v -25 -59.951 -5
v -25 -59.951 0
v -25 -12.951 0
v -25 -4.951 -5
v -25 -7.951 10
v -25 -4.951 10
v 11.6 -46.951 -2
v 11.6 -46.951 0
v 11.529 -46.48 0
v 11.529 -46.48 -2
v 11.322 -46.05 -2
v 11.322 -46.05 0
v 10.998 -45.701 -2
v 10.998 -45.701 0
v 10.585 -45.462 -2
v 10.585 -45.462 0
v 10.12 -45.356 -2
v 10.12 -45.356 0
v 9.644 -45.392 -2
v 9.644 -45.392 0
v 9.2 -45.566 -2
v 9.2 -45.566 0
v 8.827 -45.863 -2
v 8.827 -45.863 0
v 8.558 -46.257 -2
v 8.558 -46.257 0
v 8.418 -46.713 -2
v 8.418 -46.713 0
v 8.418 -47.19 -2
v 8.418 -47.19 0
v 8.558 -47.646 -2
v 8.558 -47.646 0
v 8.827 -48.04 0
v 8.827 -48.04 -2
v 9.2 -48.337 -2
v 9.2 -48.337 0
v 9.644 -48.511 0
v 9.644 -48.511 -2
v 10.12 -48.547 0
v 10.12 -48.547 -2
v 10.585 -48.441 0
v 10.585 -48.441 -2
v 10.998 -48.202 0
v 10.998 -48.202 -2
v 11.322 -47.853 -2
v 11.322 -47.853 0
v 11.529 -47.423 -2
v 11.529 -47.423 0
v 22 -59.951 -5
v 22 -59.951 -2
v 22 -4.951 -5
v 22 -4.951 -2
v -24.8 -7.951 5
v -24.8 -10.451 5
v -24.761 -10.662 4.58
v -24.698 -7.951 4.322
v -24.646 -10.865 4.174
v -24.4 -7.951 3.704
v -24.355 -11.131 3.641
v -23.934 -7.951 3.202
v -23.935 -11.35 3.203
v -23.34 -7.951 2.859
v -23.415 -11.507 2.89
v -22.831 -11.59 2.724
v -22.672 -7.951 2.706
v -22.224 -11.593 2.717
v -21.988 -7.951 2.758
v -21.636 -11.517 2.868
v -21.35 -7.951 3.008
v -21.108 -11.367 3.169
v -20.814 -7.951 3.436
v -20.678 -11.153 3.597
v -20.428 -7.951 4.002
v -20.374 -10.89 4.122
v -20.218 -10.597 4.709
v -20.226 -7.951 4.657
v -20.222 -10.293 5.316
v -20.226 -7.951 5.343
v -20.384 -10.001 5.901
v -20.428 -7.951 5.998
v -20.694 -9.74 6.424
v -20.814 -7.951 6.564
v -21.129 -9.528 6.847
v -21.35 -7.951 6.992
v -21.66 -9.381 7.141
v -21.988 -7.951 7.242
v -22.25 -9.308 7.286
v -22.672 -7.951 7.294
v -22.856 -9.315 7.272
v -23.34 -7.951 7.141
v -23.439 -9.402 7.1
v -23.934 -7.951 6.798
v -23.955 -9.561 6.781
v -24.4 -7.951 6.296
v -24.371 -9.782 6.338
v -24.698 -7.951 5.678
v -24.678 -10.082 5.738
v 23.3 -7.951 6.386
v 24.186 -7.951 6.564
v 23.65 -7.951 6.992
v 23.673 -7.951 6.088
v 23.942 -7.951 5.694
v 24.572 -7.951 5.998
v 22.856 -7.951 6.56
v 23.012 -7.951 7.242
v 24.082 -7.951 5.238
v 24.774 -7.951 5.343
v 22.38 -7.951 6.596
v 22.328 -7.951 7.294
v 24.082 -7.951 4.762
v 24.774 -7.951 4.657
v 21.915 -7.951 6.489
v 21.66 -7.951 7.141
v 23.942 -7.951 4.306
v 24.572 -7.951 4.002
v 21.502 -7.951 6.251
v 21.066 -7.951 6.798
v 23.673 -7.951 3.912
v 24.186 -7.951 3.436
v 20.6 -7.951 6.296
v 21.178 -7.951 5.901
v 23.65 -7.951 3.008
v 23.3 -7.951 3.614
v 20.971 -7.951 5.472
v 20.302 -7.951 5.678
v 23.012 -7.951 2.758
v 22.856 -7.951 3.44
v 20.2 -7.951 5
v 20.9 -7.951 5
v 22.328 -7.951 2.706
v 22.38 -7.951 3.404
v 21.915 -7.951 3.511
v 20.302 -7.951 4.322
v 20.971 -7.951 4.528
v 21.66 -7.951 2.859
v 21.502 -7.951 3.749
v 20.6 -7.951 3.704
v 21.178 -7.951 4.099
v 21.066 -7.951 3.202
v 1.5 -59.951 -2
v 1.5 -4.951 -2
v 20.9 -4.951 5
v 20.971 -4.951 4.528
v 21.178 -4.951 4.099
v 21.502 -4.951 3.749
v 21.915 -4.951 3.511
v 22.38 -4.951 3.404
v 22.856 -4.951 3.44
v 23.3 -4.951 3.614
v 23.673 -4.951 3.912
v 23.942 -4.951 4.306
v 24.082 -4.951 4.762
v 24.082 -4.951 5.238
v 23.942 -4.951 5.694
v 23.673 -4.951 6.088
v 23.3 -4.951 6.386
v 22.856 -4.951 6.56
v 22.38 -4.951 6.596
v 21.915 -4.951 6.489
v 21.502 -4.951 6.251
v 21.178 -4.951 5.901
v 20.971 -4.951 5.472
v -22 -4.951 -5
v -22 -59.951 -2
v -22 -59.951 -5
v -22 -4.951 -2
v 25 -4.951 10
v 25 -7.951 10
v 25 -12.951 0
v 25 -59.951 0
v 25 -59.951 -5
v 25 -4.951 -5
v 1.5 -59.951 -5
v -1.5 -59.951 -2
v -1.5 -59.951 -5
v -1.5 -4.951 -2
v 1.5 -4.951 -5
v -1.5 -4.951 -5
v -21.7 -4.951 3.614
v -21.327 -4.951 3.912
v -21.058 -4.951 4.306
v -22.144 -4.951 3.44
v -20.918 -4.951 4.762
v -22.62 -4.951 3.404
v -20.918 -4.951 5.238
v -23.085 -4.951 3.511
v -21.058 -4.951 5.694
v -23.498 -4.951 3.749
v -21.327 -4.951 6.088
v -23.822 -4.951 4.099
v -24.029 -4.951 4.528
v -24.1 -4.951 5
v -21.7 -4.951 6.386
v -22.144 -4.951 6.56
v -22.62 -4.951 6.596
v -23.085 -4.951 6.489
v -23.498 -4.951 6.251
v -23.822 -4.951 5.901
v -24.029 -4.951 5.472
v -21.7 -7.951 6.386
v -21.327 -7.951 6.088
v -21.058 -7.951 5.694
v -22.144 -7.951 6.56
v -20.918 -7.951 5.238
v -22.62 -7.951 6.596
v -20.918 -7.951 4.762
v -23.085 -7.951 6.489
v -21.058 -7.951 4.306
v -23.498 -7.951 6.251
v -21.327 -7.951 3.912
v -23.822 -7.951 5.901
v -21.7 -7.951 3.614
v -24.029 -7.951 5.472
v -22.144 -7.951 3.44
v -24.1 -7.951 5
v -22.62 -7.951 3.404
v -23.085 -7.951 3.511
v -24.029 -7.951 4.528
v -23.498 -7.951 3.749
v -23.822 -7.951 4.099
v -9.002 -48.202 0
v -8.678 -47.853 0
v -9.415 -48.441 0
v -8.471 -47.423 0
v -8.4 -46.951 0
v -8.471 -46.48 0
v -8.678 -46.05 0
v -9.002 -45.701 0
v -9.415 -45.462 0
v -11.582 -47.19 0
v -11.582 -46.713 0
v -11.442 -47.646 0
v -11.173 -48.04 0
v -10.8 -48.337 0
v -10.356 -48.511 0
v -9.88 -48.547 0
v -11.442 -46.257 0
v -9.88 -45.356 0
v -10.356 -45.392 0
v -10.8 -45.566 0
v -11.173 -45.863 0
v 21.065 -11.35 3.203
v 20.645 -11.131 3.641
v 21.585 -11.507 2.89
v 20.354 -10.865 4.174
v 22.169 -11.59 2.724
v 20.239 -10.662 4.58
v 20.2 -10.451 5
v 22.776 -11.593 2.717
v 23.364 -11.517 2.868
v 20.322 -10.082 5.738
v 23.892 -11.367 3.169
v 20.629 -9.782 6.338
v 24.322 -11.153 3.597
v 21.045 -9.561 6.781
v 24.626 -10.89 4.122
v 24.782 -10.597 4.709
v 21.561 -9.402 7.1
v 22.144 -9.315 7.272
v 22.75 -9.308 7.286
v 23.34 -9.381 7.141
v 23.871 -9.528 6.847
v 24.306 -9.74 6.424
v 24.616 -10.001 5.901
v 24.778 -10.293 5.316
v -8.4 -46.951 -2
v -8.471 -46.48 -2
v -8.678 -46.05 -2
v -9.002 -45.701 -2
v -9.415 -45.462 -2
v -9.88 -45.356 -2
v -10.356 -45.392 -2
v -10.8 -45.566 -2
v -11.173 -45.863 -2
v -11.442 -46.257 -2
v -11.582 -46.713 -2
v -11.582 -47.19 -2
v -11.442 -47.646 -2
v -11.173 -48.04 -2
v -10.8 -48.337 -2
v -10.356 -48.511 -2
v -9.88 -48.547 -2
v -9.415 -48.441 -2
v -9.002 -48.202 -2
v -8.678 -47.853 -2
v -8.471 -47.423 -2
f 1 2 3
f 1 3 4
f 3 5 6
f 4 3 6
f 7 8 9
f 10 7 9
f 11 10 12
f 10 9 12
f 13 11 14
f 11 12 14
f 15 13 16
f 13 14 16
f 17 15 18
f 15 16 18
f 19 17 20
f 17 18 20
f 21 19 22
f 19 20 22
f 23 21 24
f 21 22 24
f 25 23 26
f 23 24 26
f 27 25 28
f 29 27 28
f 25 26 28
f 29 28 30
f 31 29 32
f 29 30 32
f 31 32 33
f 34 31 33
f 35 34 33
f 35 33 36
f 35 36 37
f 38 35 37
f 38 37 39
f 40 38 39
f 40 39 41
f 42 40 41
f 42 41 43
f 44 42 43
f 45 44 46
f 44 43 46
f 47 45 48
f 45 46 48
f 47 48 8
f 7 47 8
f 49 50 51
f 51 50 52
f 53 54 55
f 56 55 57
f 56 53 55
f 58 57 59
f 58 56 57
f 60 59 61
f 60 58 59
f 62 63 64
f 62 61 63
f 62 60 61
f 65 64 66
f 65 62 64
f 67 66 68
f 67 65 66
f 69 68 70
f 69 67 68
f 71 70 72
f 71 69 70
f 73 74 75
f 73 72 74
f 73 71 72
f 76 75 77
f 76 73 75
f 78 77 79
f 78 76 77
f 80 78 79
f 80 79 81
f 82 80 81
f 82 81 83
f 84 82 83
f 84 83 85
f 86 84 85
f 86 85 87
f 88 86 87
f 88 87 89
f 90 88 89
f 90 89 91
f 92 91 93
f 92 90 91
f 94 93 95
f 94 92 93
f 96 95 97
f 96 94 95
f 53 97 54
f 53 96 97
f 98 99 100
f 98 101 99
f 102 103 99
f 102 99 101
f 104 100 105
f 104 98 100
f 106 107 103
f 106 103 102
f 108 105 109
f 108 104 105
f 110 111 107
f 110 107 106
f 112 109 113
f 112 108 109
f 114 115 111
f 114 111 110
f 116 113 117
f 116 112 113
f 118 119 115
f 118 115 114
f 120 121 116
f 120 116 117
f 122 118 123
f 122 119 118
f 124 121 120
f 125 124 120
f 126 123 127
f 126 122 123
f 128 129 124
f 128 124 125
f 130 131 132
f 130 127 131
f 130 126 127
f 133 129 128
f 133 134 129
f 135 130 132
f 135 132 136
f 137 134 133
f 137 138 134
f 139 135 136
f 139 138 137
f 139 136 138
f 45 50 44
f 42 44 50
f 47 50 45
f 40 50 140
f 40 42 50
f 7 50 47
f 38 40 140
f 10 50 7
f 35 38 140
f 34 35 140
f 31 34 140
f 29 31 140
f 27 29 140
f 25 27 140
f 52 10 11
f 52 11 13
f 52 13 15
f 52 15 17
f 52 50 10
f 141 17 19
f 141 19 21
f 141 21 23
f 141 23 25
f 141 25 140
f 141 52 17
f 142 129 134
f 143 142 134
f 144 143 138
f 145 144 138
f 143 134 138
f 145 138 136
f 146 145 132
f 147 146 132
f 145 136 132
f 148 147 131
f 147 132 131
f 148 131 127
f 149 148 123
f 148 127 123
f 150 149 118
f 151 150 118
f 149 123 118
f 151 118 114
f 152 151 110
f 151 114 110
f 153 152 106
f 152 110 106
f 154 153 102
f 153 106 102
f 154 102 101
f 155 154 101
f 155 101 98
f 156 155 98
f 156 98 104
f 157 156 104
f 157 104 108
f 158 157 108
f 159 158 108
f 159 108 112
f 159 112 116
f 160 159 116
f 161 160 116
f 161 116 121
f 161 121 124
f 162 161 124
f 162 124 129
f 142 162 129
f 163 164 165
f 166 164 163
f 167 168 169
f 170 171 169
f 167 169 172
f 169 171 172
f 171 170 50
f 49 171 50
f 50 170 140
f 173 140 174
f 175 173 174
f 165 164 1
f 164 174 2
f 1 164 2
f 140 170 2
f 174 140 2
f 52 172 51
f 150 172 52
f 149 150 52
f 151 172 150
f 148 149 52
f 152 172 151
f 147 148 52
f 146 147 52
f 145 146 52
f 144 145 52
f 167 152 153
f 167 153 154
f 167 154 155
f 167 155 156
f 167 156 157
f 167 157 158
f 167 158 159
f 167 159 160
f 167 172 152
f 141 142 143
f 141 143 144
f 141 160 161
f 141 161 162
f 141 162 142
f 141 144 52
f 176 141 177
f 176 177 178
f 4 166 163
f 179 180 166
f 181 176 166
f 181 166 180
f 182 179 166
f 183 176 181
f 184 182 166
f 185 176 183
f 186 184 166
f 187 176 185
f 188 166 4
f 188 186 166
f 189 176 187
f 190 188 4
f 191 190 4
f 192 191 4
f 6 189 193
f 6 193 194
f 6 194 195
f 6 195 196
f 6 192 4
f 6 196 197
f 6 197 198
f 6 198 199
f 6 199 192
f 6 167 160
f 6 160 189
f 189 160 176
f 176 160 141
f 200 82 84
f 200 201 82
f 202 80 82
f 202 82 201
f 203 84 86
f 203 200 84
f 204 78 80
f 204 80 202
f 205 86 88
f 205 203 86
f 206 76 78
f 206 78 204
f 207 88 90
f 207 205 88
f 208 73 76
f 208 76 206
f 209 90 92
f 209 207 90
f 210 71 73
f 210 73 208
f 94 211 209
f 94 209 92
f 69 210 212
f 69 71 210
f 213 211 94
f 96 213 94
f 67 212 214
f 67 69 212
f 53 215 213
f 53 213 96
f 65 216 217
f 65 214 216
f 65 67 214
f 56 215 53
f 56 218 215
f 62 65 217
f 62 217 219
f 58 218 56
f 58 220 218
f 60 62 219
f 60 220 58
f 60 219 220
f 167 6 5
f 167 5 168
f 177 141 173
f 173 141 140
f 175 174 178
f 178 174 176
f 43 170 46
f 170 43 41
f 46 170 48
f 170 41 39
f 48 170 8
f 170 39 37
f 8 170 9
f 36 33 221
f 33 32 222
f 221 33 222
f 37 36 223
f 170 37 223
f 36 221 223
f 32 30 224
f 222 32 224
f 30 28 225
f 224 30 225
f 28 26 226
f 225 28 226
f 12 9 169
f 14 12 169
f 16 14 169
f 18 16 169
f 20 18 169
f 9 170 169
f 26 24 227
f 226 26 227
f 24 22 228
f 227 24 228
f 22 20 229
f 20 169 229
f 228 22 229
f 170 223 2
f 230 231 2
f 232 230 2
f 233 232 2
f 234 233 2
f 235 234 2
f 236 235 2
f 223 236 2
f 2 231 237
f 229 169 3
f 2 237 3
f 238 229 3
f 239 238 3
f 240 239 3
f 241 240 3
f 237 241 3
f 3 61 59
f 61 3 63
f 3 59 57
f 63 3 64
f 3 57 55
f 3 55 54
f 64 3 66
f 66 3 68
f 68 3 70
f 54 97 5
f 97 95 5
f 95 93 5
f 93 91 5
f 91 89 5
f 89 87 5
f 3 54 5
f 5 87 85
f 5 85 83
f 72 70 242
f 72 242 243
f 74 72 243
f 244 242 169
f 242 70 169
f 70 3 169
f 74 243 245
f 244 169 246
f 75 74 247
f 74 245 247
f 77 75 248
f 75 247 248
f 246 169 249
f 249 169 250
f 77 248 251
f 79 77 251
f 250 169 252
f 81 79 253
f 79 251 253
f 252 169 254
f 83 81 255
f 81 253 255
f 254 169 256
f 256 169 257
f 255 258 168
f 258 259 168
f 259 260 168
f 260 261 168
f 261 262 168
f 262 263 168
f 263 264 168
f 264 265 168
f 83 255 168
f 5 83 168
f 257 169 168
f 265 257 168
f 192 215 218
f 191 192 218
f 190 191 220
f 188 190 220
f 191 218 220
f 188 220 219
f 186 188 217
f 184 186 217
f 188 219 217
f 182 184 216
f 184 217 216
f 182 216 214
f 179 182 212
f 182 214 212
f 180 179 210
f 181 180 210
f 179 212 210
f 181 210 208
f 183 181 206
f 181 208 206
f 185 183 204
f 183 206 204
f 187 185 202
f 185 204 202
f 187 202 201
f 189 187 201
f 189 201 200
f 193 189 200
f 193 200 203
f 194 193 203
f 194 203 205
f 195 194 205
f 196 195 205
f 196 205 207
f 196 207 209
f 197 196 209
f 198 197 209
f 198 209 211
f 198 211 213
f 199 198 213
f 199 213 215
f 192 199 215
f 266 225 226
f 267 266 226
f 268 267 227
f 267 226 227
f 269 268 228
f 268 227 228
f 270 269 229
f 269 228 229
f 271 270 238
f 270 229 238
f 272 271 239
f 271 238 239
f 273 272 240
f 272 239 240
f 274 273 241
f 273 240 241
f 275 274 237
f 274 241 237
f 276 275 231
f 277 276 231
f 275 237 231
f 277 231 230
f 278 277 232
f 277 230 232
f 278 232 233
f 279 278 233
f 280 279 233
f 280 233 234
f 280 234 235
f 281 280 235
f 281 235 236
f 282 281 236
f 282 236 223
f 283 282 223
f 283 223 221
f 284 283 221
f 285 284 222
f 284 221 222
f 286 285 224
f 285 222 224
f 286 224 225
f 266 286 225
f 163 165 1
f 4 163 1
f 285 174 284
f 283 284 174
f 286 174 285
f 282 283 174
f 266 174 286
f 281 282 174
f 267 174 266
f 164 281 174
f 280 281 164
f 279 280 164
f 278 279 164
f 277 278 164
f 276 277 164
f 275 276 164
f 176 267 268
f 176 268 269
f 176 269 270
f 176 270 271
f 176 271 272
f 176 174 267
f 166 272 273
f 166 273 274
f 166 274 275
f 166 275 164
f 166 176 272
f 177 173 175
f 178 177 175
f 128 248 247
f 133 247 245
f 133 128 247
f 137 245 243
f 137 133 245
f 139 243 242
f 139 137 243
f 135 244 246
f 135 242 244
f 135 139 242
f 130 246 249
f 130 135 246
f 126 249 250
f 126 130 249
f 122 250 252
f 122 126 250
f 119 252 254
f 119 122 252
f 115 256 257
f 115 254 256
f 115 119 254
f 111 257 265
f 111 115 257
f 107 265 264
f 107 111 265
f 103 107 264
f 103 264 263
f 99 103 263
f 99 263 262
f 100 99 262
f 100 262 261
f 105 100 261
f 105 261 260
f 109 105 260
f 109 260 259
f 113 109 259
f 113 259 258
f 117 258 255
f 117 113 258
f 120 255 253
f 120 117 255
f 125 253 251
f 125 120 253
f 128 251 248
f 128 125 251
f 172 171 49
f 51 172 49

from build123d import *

# Parameters (mm, degrees)
SKETCH_1_R          = 1.6
EXTRUDE_2_DEPTH     = 2
SKETCH_2_W          = 50
SKETCH_2_H          = 3
EXTRUDE_3_DEPTH     = 10
SKETCH_3_R          = 1.45
CUT_EXTRUDE_1_DEPTH = 3
EXTRUDE_4_DEPTH     = 50
SKETCH_8_R          = 1.6
CUT_EXTRUDE_4_DEPTH = 4
SKETCH_7_R          = 2.3
CUT_EXTRUDE_6_DEPTH = 20
SKETCH_10_W         = 3
SKETCH_10_H         = 55
EXTRUDE_5_DEPTH     = 3


with BuildPart() as part:
    # 草图1 → 凸台-拉伸2 (new body)
    with BuildSketch(Plane.XY):
        Polygon((25, -4.951489209), (25, -59.951489209), (-25, -59.951489209), (-25, -4.951489209), (0, -4.951489209), align=None)
        with Locations((10, -46.951489209)):
            Circle(SKETCH_1_R, mode=Mode.SUBTRACT)
        with Locations((-10, -46.951489209)):
            Circle(SKETCH_1_R, mode=Mode.SUBTRACT)
    extrude(amount=-EXTRUDE_2_DEPTH)

    # 草图2 → 凸台-拉伸3 (add)
    with BuildSketch(Plane.XY):
        with Locations((0, -6.451489209)):
            Rectangle(SKETCH_2_W, SKETCH_2_H)
    extrude(amount=EXTRUDE_3_DEPTH)

    # 草图3 → 切除-拉伸1 (cut)
    with BuildSketch(Plane(origin=(0, -7.951489209, 0), x_dir=(-1, 0, 0), z_dir=(0, -1, 0))):
        with Locations((22.5, -5)):
            Circle(SKETCH_3_R)
        with Locations((-22.5, -5)):
            Circle(SKETCH_3_R)
    extrude(amount=-CUT_EXTRUDE_1_DEPTH, mode=Mode.SUBTRACT)

    # 草图5 → 凸台-拉伸4 (add)
    with BuildSketch(Plane(origin=(25, -7.951489209, 0), x_dir=(0, 0, -1), z_dir=(1, 0, 0))):
        Polygon((-10, 0), (0, 0), (0, -5), align=None)
    extrude(amount=-EXTRUDE_4_DEPTH)

    # 草图8 → 切除-拉伸4 (cut, through all)
    with BuildSketch(Plane(origin=(0, -7.951489209, 0), x_dir=(-1, 0, 0), z_dir=(0, -1, 0))):
        with Locations((-22.5, -5)):
            Circle(SKETCH_8_R)
        with Locations((22.5, -5)):
            Circle(SKETCH_8_R)
    extrude(amount=-CUT_EXTRUDE_4_DEPTH, mode=Mode.SUBTRACT)

    # 草图7 → 切除-拉伸6 (cut)
    with BuildSketch(Plane(origin=(0, -7.951489209, 0), x_dir=(-1, 0, 0), z_dir=(0, -1, 0))):
        with Locations((-22.5, -5)):
            Circle(SKETCH_7_R)
        with Locations((22.5, -5)):
            Circle(SKETCH_7_R)
    extrude(amount=CUT_EXTRUDE_6_DEPTH, mode=Mode.SUBTRACT)

    # 草图10 → 凸台-拉伸5 (add)
    with BuildSketch(Plane(origin=(0, 0, -2), x_dir=(-1, 0, 0), z_dir=(0, 0, -1))):
        Polygon((-1.5, -59.951489209), (0, -59.951489209), (1.5, -59.951489209), (1.5, -4.951489209), (0, -4.951489209), (-1.5, -4.951489209), align=None)
        with Locations((23.5, -32.451489209)):
            Rectangle(SKETCH_10_W, SKETCH_10_H)
        with Locations((-23.5, -32.451489209)):
            Rectangle(SKETCH_10_W, SKETCH_10_H)
    extrude(amount=EXTRUDE_5_DEPTH)


solid = part.part
